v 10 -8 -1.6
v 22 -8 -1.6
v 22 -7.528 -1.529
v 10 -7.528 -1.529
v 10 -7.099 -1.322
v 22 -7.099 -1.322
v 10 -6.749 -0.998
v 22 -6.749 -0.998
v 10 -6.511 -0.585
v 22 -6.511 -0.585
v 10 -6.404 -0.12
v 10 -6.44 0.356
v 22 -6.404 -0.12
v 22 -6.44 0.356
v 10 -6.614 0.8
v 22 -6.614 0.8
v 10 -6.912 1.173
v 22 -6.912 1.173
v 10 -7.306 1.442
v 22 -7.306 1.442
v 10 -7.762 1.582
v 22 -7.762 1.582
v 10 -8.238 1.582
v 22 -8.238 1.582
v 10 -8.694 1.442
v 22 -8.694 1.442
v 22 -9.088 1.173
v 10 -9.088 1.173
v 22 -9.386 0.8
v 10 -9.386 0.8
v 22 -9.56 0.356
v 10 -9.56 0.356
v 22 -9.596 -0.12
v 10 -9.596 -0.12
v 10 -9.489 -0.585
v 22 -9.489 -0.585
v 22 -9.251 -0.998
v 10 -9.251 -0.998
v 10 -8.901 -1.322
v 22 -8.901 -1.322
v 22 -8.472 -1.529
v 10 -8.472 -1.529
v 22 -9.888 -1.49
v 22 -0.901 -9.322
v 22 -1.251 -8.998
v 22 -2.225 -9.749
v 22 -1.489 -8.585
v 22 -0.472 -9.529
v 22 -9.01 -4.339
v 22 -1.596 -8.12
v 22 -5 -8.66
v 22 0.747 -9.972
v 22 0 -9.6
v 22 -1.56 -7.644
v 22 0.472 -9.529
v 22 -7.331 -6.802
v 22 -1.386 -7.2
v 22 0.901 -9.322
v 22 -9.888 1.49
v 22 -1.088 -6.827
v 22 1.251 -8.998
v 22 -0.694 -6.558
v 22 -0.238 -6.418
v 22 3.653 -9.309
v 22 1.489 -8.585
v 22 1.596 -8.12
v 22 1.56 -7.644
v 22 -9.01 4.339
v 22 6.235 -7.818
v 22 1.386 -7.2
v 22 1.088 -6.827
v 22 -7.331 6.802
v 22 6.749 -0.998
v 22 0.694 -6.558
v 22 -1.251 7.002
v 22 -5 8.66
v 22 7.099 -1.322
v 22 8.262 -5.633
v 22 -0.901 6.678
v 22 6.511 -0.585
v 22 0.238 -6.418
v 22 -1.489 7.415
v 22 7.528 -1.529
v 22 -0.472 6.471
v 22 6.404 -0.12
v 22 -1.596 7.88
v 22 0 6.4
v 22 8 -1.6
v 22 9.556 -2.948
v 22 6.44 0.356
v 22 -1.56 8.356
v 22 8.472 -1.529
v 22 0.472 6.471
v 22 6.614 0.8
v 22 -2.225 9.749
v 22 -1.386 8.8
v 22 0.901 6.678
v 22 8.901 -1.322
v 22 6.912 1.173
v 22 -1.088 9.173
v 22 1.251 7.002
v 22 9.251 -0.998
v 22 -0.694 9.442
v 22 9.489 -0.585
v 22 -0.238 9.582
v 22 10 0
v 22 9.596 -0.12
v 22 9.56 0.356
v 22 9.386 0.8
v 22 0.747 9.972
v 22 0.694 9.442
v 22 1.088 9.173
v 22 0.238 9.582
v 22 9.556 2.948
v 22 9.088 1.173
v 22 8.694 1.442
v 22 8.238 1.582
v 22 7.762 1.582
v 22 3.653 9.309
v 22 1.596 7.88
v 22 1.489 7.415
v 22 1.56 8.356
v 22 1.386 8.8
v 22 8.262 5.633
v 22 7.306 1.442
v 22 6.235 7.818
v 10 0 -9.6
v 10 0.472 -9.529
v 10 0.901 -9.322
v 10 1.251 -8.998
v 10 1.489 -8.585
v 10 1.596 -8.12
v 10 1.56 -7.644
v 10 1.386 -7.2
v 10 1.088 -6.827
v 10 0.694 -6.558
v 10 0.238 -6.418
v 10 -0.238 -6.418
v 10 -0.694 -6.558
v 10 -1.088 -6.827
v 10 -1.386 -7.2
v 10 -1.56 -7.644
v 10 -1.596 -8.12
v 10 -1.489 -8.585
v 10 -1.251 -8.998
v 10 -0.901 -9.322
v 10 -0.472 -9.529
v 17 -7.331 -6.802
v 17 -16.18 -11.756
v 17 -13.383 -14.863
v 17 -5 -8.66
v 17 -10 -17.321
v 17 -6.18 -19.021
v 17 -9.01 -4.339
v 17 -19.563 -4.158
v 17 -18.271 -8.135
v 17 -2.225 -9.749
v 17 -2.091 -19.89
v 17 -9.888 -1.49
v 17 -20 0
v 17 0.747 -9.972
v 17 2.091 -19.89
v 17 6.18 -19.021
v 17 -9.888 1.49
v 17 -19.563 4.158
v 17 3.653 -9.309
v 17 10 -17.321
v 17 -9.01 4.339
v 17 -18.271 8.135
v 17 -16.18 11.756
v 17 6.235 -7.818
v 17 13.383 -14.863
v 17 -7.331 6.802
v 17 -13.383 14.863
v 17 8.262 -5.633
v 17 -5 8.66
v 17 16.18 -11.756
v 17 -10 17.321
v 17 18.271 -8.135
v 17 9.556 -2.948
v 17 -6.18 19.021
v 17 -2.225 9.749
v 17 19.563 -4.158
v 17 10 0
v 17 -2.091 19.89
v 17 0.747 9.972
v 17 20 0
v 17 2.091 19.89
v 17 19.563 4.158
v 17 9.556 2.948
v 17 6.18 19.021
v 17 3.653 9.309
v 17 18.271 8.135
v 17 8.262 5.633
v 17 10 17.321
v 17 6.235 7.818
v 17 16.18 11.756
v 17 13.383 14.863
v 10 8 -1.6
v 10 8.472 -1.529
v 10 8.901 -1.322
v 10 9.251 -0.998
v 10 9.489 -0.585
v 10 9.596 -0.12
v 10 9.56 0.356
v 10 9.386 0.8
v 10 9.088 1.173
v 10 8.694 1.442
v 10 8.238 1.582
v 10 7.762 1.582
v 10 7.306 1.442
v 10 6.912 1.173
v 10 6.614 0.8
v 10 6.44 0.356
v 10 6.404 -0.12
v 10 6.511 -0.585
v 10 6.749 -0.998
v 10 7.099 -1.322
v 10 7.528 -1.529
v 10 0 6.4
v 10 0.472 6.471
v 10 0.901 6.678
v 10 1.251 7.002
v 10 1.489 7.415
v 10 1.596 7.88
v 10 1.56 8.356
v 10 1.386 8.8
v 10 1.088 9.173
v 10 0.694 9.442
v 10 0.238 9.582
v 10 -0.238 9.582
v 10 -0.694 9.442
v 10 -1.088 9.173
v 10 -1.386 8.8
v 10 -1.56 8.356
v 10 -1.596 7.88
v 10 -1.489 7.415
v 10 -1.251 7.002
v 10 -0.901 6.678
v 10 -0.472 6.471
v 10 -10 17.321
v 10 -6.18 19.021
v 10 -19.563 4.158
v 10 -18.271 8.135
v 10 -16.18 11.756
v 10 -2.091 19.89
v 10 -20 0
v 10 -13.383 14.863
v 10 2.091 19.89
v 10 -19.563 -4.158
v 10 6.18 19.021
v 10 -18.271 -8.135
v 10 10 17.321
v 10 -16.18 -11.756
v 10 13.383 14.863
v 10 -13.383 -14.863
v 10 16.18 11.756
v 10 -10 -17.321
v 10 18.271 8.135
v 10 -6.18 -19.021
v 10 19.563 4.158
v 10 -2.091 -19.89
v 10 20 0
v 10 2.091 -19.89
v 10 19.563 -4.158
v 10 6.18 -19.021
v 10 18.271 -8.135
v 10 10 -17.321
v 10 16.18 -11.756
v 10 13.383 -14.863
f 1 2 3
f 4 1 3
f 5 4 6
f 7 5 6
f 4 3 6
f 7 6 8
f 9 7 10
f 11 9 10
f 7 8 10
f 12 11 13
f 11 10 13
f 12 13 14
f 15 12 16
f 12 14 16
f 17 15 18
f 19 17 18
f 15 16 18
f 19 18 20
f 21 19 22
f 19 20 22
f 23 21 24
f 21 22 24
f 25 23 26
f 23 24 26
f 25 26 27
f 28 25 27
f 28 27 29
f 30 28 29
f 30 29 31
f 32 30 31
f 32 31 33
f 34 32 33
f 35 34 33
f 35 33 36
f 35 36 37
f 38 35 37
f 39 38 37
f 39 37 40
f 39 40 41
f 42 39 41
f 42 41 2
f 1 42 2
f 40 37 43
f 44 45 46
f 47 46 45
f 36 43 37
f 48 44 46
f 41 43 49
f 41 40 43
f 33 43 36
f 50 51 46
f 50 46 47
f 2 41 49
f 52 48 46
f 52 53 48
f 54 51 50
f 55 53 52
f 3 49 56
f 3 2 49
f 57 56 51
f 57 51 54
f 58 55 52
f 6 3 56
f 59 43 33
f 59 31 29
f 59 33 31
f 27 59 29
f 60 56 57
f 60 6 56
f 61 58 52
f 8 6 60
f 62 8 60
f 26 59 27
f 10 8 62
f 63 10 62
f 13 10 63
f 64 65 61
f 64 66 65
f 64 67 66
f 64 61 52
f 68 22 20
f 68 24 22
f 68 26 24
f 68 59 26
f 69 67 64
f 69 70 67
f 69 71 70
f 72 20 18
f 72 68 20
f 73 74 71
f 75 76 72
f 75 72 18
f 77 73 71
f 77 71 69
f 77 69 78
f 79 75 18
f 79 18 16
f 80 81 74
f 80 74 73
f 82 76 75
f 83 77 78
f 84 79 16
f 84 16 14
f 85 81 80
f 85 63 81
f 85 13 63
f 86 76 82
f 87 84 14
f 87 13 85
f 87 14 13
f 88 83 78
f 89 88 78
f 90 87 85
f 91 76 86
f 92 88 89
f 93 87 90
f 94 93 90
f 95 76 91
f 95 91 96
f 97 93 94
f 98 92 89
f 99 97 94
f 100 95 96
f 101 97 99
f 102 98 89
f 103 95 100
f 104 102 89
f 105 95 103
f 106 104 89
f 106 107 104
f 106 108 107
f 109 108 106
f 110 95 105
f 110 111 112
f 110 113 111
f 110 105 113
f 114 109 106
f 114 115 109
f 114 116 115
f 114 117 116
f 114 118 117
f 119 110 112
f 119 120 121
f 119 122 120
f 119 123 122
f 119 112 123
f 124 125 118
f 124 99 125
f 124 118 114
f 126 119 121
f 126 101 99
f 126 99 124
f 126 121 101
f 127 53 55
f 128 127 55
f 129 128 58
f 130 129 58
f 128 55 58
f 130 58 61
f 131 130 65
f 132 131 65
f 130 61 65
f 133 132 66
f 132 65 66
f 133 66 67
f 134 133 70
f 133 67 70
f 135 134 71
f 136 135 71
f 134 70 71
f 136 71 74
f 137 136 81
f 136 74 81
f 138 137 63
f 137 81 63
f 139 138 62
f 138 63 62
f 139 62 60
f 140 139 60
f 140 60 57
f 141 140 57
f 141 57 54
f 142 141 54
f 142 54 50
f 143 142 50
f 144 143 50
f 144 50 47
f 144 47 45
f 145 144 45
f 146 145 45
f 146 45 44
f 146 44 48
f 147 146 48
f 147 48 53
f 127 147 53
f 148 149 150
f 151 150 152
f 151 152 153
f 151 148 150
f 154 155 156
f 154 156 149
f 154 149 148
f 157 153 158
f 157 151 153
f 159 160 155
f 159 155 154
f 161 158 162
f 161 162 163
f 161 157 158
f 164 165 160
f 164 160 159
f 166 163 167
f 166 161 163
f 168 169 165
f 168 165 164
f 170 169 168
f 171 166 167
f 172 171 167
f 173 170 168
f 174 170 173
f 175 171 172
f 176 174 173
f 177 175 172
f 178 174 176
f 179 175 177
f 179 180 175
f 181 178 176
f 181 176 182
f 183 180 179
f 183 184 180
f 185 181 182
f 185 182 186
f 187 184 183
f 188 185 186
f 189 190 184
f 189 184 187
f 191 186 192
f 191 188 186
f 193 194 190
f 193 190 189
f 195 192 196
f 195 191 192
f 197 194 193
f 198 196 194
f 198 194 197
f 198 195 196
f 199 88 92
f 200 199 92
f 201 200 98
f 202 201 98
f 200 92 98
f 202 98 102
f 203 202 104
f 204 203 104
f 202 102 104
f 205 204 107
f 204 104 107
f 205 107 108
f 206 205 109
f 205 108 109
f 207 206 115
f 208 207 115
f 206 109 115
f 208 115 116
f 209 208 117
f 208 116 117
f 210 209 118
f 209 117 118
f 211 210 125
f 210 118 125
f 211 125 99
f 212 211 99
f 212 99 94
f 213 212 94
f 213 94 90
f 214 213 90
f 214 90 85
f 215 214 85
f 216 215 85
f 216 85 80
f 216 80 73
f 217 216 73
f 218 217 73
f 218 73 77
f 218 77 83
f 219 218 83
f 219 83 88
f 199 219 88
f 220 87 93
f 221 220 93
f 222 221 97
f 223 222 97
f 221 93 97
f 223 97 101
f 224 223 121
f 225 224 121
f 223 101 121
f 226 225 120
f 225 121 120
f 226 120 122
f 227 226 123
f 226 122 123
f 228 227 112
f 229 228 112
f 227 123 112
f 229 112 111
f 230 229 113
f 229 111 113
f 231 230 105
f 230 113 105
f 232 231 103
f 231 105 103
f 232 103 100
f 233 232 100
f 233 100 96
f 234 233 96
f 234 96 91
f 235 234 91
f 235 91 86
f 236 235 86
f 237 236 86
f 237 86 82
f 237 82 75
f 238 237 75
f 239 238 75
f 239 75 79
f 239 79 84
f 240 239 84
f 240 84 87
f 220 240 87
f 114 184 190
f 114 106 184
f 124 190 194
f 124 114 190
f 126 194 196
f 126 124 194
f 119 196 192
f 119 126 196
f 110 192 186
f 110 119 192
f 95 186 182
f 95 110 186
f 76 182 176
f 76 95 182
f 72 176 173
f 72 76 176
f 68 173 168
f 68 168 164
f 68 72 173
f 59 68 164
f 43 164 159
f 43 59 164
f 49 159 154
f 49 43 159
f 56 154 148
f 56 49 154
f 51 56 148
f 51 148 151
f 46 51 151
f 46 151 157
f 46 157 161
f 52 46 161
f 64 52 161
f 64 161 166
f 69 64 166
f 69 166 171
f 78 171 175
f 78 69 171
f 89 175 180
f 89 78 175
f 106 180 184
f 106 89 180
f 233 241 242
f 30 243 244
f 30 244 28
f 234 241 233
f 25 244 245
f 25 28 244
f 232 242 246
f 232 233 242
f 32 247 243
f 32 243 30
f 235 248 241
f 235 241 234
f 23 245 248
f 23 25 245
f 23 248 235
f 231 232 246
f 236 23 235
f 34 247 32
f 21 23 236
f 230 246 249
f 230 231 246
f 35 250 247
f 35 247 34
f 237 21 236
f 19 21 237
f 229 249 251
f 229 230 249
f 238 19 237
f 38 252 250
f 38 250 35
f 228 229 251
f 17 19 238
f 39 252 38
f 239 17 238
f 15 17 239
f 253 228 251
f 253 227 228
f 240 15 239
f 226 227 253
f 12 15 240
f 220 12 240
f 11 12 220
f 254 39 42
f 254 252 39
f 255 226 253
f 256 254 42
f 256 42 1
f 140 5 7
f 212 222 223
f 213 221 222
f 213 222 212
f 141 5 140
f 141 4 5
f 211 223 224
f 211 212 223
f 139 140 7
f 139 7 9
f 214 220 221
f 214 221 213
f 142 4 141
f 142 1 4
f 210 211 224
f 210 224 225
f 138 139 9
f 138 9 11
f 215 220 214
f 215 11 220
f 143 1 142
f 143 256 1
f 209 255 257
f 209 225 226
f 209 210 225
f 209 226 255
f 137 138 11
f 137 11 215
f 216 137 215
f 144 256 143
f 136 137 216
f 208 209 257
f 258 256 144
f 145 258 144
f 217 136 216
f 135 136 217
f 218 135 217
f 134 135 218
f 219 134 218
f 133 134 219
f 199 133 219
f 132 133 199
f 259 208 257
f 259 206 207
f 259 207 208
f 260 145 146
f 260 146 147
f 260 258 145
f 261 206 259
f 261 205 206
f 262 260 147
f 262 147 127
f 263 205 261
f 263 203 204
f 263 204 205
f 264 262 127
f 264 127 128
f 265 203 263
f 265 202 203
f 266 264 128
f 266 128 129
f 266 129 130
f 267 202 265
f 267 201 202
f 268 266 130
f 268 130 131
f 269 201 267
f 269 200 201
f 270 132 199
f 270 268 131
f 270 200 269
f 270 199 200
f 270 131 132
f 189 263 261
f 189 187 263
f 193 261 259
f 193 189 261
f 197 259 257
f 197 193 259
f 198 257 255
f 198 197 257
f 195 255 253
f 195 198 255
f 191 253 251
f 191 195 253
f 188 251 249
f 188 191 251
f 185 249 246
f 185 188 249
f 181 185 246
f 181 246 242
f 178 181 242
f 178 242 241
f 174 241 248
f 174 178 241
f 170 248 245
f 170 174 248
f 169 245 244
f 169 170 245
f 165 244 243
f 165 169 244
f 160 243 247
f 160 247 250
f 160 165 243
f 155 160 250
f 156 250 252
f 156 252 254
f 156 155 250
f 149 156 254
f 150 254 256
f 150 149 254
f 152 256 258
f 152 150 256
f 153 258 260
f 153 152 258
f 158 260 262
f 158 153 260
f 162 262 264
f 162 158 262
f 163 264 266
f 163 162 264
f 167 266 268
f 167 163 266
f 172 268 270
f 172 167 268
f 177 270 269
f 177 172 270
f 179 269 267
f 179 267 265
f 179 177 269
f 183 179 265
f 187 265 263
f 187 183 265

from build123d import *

# Parameters (mm, degrees)
CUT_EXTRUDE_1_DEPTH      = 10
CUT_EXTRUDE_1_DEPTH_BACK = 10
SKETCH_3_W               = 10
SKETCH_3_H               = 4.3
SKETCH_4_R               = 1.6
CUT_EXTRUDE_2_DEPTH      = 23


with BuildPart() as part:
    # 草图1 → 旋转1 (revolve)
    with BuildSketch(Plane.XY):
        Polygon((0, 0), (0, 2), (10, 2), (10, 20), (17, 20), (17, 10), (22, 10), (22, 0), align=None)
    revolve(axis=Axis((0, 0, 0), (1, 0, 0)))

    # 草图3 → 切除-拉伸1 (cut, two sides: drawn at the far end of the back side and taken through both)
    with BuildSketch(Plane.XY.offset(-CUT_EXTRUDE_1_DEPTH_BACK)):
        with Locations((5, 0.15)):
            Rectangle(SKETCH_3_W, SKETCH_3_H)
    extrude(amount=CUT_EXTRUDE_1_DEPTH + CUT_EXTRUDE_1_DEPTH_BACK, mode=Mode.SUBTRACT)

    # 草图4 → 切除-拉伸2 (cut)
    with BuildSketch(Plane(origin=(22, 0, 0), x_dir=(0, 0, -1), z_dir=(1, 0, 0))):
        with Locations((0, 8)):
            Circle(SKETCH_4_R)
        with Locations((8, 0)):
            Circle(SKETCH_4_R)
        with Locations((0, -8)):
            Circle(SKETCH_4_R)
        with Locations((-8, 0)):
            Circle(SKETCH_4_R)
    extrude(amount=-CUT_EXTRUDE_2_DEPTH, mode=Mode.SUBTRACT)


solid = part.part
